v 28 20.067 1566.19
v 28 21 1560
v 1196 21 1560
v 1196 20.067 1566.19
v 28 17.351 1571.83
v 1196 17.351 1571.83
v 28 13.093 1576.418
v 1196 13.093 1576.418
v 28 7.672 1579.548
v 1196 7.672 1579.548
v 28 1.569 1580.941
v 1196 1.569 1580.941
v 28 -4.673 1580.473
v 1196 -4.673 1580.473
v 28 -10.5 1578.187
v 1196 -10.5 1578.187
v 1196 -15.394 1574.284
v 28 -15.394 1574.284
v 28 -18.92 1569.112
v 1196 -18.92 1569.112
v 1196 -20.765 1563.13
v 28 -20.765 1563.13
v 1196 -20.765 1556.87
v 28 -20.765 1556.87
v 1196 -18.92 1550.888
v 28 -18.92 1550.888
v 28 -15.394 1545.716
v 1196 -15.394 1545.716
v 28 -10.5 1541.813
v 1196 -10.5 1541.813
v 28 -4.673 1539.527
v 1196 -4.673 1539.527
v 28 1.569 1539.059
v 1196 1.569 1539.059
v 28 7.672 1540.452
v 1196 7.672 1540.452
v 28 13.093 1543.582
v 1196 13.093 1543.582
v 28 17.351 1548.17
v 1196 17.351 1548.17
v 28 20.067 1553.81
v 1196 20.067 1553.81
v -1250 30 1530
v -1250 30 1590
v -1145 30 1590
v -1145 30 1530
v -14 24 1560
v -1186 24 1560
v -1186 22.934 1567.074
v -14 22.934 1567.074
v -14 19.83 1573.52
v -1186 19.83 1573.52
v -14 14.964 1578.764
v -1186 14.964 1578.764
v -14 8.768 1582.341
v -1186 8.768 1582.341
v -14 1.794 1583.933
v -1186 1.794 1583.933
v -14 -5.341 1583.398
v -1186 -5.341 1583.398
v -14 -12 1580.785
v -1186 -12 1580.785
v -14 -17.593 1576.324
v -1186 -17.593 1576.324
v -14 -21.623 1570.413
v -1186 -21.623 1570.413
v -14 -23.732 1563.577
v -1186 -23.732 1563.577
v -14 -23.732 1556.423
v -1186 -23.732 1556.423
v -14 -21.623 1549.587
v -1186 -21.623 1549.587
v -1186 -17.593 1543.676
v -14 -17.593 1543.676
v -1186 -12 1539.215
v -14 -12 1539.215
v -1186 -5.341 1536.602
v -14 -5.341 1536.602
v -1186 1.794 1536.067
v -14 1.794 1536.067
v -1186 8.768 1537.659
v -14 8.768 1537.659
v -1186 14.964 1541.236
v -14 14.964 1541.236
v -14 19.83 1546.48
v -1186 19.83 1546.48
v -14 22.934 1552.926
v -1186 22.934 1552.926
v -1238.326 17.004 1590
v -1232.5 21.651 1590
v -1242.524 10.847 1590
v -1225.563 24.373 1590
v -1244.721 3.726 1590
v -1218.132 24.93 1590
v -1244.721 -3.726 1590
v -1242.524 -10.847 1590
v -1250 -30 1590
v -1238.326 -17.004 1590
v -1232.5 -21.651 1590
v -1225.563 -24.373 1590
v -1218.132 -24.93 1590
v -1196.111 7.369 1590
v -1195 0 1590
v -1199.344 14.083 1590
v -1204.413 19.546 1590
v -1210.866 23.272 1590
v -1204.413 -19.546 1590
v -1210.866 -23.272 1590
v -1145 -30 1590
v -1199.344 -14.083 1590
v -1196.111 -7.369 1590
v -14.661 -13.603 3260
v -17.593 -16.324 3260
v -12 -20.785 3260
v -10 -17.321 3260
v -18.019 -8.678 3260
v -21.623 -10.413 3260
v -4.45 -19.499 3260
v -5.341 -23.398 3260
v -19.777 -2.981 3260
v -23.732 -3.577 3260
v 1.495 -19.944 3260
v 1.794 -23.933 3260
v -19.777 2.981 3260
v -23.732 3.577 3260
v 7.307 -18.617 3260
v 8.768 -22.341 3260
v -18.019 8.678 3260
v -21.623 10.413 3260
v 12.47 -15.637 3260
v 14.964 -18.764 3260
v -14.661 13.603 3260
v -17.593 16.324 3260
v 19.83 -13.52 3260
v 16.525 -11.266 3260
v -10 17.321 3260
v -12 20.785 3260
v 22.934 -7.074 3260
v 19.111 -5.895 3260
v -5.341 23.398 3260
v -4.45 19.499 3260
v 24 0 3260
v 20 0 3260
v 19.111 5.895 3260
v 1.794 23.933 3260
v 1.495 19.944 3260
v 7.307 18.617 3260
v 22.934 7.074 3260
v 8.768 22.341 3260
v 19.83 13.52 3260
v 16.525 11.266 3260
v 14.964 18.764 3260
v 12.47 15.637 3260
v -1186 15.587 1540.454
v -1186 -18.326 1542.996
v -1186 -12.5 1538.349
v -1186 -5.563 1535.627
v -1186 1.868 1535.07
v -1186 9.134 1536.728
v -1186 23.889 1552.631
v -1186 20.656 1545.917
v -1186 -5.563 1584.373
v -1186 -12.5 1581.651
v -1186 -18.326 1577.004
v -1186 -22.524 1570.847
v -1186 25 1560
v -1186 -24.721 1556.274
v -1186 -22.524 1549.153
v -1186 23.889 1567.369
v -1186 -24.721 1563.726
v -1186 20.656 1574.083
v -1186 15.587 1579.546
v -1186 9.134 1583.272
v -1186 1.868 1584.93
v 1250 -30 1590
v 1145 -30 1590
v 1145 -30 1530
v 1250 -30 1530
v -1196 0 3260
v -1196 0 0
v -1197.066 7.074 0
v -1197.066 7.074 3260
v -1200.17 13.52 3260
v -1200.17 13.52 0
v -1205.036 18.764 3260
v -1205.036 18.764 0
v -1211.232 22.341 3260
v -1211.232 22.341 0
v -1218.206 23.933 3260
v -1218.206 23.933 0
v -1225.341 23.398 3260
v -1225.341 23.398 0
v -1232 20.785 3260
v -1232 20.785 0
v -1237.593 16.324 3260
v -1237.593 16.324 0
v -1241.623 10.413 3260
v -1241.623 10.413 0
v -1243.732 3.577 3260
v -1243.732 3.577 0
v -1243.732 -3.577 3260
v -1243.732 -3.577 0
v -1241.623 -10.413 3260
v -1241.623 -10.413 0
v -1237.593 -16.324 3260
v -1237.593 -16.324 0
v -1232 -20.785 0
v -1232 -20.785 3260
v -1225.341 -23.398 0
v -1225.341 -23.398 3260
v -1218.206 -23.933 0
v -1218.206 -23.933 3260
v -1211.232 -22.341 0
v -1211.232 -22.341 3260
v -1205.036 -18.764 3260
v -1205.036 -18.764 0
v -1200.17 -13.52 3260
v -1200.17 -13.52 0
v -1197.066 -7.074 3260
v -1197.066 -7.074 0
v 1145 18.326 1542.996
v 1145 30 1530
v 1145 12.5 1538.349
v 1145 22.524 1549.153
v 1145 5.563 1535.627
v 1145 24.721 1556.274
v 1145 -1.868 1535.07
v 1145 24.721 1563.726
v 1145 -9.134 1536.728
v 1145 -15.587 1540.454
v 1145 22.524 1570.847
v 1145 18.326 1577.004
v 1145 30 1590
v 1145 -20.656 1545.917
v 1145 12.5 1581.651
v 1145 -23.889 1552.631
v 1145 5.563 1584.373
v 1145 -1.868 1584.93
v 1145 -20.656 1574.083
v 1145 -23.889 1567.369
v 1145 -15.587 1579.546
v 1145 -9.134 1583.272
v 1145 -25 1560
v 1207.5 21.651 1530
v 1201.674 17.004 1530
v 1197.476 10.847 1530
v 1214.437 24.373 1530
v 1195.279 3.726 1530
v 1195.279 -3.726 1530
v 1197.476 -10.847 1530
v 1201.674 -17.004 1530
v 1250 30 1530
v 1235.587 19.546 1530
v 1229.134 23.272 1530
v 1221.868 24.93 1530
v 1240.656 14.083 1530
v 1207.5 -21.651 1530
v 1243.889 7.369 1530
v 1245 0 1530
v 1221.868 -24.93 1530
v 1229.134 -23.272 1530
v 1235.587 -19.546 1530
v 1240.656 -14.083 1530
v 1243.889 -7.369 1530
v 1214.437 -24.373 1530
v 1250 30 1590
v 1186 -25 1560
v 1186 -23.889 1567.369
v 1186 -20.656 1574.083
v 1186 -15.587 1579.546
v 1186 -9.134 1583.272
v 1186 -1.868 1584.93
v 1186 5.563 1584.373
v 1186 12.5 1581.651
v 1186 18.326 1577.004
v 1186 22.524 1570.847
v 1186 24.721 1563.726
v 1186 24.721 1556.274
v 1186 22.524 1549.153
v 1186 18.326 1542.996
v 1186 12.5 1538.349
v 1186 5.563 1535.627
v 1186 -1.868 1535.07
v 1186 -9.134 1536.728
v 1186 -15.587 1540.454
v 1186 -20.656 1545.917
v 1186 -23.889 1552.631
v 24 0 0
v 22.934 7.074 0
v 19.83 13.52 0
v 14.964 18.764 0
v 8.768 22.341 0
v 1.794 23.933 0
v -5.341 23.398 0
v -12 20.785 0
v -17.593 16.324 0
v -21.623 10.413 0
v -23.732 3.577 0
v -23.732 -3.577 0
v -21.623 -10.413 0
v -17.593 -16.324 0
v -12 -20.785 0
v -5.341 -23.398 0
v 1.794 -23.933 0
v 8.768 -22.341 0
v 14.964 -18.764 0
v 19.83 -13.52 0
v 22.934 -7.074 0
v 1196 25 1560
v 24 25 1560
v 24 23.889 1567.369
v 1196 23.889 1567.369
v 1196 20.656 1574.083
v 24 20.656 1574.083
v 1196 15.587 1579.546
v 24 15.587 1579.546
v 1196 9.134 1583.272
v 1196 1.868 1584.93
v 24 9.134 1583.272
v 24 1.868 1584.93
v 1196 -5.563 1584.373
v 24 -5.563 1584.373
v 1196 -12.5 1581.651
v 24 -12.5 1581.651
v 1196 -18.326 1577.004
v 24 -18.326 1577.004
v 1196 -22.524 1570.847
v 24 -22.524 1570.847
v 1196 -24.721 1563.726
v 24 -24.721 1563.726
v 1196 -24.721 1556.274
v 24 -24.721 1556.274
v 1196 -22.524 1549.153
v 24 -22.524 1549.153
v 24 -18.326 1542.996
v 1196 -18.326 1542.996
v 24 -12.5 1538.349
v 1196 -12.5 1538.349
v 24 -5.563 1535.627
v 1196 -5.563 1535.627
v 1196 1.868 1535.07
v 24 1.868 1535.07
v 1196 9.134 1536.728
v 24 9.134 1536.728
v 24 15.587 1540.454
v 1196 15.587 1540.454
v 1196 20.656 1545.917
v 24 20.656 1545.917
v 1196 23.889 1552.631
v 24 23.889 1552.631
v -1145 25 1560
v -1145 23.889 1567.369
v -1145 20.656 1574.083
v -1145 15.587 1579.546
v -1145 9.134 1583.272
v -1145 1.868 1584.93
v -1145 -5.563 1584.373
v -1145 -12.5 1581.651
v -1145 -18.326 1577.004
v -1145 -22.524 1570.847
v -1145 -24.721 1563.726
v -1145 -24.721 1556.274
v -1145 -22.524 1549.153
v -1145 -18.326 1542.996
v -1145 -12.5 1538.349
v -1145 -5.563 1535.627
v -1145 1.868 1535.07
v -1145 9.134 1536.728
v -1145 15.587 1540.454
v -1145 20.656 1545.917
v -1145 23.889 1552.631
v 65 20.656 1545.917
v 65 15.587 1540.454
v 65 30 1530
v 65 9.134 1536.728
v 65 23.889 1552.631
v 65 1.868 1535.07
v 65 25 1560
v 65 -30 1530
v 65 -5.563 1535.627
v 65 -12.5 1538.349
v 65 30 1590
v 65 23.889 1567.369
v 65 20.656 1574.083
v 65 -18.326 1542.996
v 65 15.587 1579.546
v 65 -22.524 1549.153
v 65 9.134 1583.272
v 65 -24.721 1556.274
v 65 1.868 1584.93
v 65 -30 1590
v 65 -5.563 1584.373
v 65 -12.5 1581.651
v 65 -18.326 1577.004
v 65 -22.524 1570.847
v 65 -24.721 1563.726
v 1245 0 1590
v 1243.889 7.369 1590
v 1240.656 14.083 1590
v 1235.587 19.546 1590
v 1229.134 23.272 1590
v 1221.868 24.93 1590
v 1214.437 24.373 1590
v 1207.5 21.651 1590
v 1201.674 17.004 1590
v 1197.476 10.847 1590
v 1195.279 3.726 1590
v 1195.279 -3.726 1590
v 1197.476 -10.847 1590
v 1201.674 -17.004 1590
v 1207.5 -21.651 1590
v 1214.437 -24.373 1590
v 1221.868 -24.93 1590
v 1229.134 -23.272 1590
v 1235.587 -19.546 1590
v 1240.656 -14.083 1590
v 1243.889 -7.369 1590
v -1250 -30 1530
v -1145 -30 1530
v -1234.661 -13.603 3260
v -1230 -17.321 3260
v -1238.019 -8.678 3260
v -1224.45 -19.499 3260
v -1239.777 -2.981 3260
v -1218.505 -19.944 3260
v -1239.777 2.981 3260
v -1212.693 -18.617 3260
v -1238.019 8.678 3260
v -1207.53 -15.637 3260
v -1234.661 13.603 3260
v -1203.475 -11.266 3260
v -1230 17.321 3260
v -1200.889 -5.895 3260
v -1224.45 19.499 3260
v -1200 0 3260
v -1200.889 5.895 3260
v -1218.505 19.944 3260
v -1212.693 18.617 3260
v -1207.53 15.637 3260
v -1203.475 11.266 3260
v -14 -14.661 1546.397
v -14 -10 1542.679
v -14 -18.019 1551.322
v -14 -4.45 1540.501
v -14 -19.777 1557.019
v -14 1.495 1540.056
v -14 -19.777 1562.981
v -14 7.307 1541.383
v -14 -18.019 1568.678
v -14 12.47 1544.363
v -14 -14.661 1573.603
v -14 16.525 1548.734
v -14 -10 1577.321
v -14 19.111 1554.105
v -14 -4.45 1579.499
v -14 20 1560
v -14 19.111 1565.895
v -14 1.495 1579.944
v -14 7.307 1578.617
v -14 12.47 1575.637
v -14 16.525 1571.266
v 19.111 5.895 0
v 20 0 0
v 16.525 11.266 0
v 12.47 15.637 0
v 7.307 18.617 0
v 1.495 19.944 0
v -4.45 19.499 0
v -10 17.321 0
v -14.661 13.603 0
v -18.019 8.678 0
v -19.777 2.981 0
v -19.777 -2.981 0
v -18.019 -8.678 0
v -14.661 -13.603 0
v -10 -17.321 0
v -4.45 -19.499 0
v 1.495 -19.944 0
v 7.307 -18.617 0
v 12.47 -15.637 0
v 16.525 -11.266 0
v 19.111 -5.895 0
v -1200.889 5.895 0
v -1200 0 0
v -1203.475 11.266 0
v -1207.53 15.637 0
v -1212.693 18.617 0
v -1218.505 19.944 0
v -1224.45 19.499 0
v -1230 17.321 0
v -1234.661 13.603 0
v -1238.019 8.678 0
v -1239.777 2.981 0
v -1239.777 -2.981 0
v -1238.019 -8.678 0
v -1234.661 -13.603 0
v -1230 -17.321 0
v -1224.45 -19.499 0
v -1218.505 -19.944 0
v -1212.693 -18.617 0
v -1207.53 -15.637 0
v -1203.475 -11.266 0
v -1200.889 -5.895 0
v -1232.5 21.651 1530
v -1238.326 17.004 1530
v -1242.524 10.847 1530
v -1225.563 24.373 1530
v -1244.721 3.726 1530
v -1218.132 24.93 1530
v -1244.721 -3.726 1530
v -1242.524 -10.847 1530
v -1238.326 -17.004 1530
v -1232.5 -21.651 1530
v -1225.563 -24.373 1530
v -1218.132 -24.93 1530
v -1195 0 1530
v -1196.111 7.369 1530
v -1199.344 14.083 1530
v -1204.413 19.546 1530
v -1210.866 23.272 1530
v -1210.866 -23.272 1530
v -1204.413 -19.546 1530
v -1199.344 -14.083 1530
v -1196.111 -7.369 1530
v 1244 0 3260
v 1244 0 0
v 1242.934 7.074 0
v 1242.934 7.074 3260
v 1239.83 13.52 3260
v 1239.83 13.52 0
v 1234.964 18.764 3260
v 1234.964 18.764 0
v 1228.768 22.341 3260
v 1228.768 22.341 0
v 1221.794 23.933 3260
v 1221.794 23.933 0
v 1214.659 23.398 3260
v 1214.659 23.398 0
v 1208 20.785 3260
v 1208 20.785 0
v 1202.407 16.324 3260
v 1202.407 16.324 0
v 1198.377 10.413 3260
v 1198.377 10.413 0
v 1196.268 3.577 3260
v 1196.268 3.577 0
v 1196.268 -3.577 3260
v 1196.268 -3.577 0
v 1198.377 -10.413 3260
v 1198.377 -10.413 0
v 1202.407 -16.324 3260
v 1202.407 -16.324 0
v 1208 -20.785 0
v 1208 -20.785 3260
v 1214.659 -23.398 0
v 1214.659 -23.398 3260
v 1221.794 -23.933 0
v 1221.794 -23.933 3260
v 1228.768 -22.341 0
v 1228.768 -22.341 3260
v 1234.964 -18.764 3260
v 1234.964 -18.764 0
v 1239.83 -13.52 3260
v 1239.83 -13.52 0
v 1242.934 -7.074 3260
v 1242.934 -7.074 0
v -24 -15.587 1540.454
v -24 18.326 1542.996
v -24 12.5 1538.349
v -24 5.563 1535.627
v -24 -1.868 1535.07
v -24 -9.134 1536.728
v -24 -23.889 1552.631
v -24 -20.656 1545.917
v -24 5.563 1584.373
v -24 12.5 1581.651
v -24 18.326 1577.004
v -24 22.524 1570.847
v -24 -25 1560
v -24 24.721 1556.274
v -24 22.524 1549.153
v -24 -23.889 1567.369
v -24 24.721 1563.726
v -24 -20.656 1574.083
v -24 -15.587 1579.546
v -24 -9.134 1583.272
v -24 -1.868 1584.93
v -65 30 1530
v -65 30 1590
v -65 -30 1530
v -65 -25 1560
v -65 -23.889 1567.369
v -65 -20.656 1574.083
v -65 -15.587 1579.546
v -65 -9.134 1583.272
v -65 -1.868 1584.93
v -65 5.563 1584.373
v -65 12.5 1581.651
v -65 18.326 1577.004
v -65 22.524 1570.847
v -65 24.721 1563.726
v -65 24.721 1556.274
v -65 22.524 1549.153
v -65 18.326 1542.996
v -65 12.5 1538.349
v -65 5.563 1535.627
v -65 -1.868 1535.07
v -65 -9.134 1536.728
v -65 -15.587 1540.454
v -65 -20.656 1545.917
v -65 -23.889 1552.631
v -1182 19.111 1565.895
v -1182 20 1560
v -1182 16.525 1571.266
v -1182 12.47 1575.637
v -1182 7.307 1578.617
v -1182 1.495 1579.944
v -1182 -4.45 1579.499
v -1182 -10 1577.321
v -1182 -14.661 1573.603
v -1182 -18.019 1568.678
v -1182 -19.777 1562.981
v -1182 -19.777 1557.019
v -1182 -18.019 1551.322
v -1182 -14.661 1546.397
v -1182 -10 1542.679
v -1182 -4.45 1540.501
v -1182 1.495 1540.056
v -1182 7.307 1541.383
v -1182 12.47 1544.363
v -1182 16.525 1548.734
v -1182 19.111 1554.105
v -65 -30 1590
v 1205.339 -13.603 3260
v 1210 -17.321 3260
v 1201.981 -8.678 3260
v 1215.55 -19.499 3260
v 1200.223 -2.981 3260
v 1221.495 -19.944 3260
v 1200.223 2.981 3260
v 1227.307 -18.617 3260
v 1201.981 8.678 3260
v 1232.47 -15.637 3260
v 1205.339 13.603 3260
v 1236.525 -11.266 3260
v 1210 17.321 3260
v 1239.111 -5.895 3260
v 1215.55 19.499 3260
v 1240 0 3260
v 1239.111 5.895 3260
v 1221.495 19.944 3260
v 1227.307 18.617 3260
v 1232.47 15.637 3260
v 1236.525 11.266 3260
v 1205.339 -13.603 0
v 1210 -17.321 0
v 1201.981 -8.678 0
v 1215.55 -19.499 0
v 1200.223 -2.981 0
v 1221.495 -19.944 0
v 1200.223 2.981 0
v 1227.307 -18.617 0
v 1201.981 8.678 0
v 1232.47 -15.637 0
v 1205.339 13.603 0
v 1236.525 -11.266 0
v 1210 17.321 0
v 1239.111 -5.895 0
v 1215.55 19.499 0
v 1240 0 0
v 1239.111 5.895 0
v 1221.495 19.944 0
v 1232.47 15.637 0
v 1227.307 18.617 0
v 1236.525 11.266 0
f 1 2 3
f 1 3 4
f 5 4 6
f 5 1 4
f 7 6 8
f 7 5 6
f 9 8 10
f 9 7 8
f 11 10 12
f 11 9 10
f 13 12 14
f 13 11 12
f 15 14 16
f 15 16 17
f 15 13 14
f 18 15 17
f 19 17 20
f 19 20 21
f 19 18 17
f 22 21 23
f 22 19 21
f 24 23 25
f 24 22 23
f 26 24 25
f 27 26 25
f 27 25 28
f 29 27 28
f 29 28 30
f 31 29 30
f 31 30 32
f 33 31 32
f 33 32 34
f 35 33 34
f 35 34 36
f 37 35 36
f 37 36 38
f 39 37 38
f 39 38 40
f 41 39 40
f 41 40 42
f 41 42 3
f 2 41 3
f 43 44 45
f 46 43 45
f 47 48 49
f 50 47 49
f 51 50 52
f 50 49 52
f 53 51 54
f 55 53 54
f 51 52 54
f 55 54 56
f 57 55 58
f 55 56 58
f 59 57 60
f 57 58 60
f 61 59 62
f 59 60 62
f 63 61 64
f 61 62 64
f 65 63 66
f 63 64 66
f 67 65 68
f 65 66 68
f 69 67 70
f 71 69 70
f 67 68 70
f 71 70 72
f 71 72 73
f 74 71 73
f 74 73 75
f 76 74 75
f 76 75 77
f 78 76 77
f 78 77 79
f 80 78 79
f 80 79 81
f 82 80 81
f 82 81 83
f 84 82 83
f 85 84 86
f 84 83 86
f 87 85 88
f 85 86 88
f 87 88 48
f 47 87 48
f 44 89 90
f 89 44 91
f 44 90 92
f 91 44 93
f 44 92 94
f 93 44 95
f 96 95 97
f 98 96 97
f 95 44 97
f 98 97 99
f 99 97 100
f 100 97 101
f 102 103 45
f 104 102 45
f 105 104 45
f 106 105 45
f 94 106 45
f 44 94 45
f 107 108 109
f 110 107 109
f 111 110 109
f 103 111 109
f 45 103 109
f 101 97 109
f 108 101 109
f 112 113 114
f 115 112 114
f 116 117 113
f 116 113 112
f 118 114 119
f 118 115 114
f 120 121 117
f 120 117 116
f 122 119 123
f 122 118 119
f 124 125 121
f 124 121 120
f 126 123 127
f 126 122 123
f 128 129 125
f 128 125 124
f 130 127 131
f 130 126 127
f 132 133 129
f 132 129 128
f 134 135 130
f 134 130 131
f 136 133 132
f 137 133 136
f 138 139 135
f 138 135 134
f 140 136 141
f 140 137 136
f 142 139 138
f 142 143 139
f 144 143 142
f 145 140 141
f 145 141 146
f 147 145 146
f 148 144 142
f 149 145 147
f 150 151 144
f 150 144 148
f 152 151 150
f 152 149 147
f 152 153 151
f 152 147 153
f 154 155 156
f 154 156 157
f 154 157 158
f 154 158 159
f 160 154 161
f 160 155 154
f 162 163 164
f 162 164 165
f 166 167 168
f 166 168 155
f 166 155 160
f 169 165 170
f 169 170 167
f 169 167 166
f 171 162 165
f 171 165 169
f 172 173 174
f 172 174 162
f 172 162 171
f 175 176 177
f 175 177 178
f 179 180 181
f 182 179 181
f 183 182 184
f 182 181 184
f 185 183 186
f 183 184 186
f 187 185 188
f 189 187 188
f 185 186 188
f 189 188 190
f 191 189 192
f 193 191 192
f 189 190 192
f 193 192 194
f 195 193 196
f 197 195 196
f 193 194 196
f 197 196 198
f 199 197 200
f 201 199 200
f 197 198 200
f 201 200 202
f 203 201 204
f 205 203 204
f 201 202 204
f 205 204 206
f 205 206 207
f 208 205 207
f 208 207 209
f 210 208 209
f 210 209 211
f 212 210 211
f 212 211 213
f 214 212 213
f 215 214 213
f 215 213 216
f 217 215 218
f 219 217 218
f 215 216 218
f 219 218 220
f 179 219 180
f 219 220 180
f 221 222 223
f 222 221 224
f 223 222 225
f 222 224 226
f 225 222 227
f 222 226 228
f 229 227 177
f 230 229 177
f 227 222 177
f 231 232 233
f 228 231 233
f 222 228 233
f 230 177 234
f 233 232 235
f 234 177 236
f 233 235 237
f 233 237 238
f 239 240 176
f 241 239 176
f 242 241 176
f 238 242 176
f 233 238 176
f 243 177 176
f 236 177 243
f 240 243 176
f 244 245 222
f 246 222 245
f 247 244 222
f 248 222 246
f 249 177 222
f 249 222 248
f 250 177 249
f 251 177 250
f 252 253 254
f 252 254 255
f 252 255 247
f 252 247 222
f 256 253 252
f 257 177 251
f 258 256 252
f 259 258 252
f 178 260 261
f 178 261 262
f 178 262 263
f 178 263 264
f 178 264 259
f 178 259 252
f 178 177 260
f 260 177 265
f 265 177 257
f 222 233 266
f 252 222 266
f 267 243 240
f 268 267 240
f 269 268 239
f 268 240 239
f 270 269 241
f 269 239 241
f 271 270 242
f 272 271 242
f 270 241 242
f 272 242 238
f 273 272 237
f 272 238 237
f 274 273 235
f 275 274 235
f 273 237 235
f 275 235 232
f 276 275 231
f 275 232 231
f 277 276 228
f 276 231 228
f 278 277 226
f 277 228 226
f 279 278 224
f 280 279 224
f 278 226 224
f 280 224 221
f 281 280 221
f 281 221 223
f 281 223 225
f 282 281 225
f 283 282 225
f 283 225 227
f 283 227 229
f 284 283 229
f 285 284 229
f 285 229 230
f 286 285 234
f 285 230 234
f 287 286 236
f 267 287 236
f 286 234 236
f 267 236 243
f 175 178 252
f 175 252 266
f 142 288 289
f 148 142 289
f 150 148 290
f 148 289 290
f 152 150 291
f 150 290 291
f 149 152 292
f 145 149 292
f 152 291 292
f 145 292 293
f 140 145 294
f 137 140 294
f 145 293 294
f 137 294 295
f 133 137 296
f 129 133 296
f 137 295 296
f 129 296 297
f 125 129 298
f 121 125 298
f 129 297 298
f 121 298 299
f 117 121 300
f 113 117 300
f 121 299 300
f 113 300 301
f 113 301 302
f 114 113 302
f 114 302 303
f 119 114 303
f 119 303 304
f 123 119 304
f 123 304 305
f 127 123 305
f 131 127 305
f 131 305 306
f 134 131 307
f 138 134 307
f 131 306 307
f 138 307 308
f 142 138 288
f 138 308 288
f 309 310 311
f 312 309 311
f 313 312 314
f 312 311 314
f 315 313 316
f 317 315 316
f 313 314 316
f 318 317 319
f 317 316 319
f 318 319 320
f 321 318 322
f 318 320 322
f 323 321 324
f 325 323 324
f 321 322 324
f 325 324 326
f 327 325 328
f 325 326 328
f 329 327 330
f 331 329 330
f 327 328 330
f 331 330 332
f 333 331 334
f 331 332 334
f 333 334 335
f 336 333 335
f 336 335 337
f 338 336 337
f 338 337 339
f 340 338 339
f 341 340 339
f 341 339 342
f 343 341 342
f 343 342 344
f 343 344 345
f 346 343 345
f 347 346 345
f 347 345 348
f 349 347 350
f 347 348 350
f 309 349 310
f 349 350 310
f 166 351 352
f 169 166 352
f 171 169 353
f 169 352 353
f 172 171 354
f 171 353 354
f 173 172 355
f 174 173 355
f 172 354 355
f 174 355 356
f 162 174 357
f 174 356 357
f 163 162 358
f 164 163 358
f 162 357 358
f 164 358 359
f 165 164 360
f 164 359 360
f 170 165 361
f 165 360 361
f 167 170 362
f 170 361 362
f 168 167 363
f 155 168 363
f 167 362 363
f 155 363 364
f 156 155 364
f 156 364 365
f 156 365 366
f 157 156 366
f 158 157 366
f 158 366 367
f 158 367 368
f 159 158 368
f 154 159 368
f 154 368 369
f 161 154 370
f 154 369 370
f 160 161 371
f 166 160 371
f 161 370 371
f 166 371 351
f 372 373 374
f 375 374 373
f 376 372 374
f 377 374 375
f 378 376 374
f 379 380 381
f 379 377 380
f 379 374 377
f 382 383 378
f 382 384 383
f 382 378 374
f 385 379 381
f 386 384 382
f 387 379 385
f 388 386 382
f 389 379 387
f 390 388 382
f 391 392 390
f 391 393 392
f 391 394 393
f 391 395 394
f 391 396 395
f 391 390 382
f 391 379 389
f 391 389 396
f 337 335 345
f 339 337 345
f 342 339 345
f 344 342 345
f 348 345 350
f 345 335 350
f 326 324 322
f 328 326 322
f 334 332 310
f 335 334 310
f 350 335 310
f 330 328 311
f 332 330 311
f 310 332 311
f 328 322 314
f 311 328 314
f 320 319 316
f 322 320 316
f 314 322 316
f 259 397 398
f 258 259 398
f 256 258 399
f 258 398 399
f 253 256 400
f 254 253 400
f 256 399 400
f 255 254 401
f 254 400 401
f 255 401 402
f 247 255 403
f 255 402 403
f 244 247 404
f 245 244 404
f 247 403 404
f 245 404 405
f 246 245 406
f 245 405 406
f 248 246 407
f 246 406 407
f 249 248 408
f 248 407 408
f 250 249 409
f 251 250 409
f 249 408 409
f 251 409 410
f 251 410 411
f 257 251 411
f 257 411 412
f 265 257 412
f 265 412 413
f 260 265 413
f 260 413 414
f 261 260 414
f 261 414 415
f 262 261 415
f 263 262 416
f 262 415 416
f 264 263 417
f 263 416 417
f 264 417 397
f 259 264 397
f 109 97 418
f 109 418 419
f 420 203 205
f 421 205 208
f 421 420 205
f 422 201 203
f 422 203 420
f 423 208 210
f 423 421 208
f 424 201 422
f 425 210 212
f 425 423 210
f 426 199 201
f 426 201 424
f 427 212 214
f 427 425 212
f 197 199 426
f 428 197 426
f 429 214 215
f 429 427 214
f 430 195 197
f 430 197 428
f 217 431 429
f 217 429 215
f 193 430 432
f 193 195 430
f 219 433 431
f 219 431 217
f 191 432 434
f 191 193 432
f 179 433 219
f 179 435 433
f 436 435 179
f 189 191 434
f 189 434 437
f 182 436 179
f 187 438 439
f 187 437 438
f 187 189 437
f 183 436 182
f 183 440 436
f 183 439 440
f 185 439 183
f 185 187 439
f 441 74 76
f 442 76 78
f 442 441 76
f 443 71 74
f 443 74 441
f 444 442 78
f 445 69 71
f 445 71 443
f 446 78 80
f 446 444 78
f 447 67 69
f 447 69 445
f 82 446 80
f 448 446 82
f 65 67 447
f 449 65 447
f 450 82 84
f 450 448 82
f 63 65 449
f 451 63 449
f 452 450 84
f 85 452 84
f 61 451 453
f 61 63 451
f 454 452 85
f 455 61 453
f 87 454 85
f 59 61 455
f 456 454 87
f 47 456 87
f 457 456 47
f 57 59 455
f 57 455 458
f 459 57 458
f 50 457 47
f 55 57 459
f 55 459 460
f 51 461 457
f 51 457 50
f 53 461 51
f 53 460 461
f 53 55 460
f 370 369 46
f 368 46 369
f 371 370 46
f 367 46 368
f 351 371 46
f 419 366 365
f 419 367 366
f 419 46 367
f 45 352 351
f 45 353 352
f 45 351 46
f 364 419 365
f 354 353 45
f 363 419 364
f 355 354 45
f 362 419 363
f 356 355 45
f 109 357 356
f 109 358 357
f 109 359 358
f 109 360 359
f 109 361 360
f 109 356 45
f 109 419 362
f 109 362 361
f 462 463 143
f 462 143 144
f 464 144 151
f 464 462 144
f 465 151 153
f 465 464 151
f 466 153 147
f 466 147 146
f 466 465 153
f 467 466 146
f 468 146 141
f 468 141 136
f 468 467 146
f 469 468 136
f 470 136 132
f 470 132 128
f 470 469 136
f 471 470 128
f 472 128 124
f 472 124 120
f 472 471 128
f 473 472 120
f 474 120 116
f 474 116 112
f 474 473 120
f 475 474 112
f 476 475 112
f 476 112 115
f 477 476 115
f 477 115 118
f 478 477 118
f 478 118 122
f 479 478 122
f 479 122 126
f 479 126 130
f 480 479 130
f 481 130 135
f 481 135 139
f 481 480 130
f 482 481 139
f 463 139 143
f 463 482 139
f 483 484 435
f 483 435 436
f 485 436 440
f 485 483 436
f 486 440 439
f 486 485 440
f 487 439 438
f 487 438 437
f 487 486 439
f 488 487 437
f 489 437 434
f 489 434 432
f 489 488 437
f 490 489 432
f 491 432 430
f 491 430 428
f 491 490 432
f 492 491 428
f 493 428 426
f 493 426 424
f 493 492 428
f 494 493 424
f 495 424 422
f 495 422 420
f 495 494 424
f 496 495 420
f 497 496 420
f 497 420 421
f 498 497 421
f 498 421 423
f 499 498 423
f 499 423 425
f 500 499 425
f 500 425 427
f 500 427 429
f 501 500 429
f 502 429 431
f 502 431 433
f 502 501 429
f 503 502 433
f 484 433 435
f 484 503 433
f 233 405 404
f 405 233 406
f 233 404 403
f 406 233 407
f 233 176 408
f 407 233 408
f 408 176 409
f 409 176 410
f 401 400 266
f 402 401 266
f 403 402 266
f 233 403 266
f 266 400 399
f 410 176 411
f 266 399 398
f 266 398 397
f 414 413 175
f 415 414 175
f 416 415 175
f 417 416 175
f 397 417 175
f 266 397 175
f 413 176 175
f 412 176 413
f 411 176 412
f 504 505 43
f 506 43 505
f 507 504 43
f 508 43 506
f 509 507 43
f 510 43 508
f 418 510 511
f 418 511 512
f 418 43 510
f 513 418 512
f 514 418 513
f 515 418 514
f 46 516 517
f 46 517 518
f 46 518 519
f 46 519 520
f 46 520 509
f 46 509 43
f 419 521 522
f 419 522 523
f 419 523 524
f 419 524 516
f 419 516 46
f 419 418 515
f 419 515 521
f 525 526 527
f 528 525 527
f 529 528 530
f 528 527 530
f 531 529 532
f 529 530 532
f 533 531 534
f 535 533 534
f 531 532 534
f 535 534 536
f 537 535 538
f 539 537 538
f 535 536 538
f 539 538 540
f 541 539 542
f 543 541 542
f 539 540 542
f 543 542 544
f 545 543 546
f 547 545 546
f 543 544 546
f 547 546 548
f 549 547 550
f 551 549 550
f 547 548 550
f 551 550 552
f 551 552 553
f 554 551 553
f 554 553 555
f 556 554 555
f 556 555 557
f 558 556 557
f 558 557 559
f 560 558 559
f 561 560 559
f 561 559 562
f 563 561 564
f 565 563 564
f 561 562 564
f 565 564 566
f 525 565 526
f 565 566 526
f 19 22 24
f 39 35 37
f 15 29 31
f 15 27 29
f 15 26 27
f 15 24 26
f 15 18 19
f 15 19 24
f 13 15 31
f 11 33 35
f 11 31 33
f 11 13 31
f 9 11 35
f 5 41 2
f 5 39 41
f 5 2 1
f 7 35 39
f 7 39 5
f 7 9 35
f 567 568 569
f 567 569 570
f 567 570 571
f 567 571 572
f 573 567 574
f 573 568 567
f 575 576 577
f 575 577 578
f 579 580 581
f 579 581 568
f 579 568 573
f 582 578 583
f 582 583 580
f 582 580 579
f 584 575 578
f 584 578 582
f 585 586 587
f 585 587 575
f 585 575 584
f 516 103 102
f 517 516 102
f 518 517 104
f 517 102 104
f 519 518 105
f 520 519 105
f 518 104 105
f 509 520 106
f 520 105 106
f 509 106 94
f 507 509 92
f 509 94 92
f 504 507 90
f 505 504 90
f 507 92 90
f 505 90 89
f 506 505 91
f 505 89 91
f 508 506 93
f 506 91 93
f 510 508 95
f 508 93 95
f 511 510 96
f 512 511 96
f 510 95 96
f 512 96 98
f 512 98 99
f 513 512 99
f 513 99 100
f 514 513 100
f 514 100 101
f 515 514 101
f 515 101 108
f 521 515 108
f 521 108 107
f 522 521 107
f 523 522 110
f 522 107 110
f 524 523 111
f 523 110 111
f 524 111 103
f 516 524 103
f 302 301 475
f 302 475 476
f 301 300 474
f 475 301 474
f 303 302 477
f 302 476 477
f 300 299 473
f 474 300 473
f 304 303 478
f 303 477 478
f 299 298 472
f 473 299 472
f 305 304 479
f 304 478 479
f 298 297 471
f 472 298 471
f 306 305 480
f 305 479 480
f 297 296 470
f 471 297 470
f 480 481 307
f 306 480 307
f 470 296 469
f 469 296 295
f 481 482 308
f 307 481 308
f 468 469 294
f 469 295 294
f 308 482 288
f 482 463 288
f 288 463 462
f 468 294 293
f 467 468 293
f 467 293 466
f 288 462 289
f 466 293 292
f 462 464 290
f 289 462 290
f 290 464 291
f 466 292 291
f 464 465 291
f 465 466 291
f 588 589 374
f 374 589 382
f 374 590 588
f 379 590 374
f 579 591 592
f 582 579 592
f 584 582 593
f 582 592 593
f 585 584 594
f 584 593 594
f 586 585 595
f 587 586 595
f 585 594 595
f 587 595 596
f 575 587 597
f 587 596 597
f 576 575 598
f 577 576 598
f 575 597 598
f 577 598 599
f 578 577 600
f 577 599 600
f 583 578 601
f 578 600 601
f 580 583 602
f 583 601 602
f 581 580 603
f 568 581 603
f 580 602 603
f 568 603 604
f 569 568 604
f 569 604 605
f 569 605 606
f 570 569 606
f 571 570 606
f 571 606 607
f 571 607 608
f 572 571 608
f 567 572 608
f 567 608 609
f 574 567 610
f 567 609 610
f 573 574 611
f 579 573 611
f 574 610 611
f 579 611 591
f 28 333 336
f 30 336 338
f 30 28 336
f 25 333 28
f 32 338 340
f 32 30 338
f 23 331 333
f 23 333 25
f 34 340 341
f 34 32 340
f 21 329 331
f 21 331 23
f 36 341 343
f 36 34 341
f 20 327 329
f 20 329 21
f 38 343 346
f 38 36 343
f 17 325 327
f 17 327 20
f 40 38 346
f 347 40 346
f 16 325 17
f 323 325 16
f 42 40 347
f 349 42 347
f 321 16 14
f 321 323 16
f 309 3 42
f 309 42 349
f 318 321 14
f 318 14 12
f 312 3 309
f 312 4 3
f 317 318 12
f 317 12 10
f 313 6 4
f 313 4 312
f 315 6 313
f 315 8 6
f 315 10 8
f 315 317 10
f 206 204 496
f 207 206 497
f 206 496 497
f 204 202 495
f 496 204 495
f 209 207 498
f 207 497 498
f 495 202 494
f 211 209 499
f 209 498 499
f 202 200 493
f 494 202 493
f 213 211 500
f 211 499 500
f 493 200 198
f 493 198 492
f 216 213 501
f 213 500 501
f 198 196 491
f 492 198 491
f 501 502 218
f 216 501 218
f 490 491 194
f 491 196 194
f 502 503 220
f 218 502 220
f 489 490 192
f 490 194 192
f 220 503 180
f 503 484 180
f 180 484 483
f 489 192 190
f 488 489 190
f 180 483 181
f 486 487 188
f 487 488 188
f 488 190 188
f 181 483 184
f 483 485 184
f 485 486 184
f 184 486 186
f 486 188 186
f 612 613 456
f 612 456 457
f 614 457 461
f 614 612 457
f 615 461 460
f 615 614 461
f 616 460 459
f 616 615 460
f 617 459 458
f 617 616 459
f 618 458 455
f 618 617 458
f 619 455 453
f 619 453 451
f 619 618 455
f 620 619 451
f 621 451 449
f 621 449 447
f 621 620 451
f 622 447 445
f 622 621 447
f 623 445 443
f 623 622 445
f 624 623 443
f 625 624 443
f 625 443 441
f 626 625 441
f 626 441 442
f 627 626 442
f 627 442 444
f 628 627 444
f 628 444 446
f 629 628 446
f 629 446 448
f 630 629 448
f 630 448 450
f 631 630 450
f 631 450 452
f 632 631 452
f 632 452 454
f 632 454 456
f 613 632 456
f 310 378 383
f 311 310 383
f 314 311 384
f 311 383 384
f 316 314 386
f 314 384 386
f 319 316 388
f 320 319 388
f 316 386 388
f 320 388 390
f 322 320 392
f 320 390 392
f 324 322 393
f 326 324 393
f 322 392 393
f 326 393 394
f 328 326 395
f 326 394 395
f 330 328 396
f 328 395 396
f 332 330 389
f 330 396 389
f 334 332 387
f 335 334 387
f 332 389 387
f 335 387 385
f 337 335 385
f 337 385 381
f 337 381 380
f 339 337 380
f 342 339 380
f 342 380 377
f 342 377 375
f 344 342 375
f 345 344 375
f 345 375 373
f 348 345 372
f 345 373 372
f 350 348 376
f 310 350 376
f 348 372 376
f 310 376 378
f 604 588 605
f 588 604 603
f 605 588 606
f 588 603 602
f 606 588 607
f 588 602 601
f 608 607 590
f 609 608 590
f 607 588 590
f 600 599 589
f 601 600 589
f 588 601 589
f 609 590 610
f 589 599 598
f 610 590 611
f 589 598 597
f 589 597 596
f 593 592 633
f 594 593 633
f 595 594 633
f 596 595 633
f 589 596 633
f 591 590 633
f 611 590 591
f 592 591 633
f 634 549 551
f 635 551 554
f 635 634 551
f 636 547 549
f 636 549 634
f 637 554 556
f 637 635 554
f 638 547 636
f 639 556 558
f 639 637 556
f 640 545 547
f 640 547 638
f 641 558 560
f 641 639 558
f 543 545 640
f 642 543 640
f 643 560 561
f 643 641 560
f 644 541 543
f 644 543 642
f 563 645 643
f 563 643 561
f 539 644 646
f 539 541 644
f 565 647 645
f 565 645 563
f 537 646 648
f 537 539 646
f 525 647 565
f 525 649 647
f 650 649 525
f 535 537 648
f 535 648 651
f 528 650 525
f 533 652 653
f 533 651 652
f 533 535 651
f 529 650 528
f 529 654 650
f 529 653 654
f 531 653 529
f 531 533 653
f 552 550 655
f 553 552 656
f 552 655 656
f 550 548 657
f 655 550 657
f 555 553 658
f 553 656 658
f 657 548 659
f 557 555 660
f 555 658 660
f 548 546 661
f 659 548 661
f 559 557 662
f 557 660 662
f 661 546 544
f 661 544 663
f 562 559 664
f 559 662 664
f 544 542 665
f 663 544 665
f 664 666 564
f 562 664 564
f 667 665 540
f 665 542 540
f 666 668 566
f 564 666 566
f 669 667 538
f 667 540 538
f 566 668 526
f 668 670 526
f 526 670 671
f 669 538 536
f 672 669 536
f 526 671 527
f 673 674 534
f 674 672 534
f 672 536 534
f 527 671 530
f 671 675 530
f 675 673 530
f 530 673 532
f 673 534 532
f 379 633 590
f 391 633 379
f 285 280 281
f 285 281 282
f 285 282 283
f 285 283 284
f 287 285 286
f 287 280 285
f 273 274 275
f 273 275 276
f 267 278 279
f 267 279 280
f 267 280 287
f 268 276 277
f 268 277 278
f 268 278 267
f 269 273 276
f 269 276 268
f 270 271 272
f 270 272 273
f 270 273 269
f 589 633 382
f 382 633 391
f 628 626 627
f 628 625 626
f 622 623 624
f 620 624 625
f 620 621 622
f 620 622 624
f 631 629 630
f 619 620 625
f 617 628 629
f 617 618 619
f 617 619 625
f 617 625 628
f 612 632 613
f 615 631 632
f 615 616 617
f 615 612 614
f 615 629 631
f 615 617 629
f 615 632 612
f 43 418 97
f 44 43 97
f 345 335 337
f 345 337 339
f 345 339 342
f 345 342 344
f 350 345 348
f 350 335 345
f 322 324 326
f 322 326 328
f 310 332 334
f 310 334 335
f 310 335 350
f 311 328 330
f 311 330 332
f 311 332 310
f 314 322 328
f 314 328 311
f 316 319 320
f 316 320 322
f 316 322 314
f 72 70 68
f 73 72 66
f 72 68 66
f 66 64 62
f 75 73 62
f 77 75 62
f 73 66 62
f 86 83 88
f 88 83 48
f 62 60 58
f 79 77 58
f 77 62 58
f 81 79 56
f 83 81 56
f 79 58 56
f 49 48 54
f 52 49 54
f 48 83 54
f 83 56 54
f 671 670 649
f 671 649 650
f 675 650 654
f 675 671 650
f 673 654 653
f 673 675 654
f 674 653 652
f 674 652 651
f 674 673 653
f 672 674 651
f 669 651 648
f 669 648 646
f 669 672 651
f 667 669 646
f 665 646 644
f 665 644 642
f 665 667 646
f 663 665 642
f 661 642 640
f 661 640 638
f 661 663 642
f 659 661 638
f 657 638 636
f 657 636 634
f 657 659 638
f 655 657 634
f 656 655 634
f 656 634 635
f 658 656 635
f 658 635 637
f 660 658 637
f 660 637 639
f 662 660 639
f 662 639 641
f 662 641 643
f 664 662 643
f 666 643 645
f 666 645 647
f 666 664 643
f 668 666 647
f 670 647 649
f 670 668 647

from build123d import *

# Parameters (mm, degrees)
F0_R          = 24
F0_R_2        = 20
F1_DEPTH      = 3260
F2_W          = 130
F2_H          = 60
F3_DEPTH      = 30
F3_DEPTH_BACK = 30
F2_W_2        = 105
F4_R          = 25
F5_DEPTH      = 60
F9_R          = 25
F10_DEPTH     = 41
F8_R          = 25
F11_DEPTH     = 41
F7_R          = 25
F12_DEPTH     = 41
F6_R          = 25
F13_DEPTH     = 41
F14_R         = 24
F15_DEPTH     = 1172
F16_DEPTH     = 1172
F17_T         = -4
F18_T         = -4


with BuildPart() as f1:
    # F0 (on Top) → F1 (new body)
    with BuildSketch(Plane.XY):
        Circle(F0_R)
        Circle(F0_R_2, mode=Mode.SUBTRACT)
    extrude(amount=F1_DEPTH)


with BuildPart() as f1b:
    # F0 (on Top) → F1, piece 2 (new body)
    with BuildSketch(Plane.XY):
        with Locations((-1220, 0)):
            Circle(F0_R)
        with Locations((-1220, 0)):
            Circle(F0_R_2, mode=Mode.SUBTRACT)
    extrude(amount=F1_DEPTH)


with BuildPart() as f1c:
    # F0 (on Top) → F1, piece 3 (new body)
    with BuildSketch(Plane.XY):
        with Locations((1220, 0)):
            Circle(F0_R)
        with Locations((1220, 0)):
            Circle(F0_R_2, mode=Mode.SUBTRACT)
    extrude(amount=F1_DEPTH)


with BuildPart() as f3:
    # F2 (on Front) → F3 (new body, two sides)
    with BuildSketch(Plane.XZ) as f3_sk:
        with Locations((0, 1560)):
            Rectangle(F2_W, F2_H)
    extrude(amount=F3_DEPTH)
    extrude(f3_sk.sketch, amount=-F3_DEPTH_BACK)

    # F9 (on face) → F10 (cut)
    with BuildSketch(Plane.YZ.offset(65)):
        with Locations((0, 1560)):
            Circle(F9_R)
    extrude(amount=-F10_DEPTH, mode=Mode.SUBTRACT)

    # F7 (on face) → F12 (cut)
    with BuildSketch(Plane(origin=(-65, 0, 0), x_dir=(0, -1, 0), z_dir=(-1, 0, 0))):
        with Locations((0, 1560)):
            Circle(F7_R)
    extrude(amount=-F12_DEPTH, mode=Mode.SUBTRACT)


with BuildPart() as f3b:
    # F2 (on Front) → F3, piece 2 (new body, two sides)
    with BuildSketch(Plane.XZ) as f3_2_sk:
        with Locations((-1197.5, 1560)):
            Rectangle(F2_W_2, F2_H)
    extrude(amount=F3_DEPTH)
    extrude(f3_2_sk.sketch, amount=-F3_DEPTH_BACK)


with BuildPart() as f3c:
    # F2 (on Front) → F3, piece 3 (new body, two sides)
    with BuildSketch(Plane.XZ) as f3_3_sk:
        with Locations((1197.5, 1560)):
            Rectangle(F2_W_2, F2_H)
    extrude(amount=F3_DEPTH)
    extrude(f3_3_sk.sketch, amount=-F3_DEPTH_BACK)


with BuildPart() as f5_tool:
    # F4 (on face) → F5 (new body)
    with BuildSketch(Plane.XY.offset(1590)):
        with Locations((-1220, 0)):
            Circle(F4_R)
        with Locations((1220, 0)):
            Circle(F4_R)
    extrude(amount=-F5_DEPTH)


with BuildPart() as f3b_1:
    add(f3b.part)

    # F5: cut by f5_tool
    add(f5_tool.part, mode=Mode.SUBTRACT)

    # F6 (on face) → F13 (cut)
    with BuildSketch(Plane.YZ.offset(-1145)):
        with Locations((0, 1560)):
            Circle(F6_R)
    extrude(amount=-F13_DEPTH, mode=Mode.SUBTRACT)


with BuildPart() as f3c_1:
    add(f3c.part)

    # F5: cut by f5_tool
    add(f5_tool.part, mode=Mode.SUBTRACT)

    # F8 (on face) → F11 (cut)
    with BuildSketch(Plane(origin=(1145, 0, 0), x_dir=(0, -1, 0), z_dir=(-1, 0, 0))):
        with Locations((0, 1560)):
            Circle(F8_R)
    extrude(amount=-F11_DEPTH, mode=Mode.SUBTRACT)


with BuildPart() as f15:
    # F14 (on face) → F15 (new body)
    with BuildSketch(Plane.YZ.offset(-1186)):
        with Locations((0, 1560)):
            Circle(F14_R)
    extrude(amount=F15_DEPTH)

    # F17
    f17_openings = [f15.faces().sort_by_distance(p)[0] for p in [
        (-14, 0, 1560),
    ]]
    offset(amount=F17_T, openings=f17_openings)


with BuildPart() as f16:
    # F16 (new): a face of the model
    f16_faces = [f3.part.faces().sort_by_distance(p)[0] for p in [
        (24, 0, 1560),
    ]]
    extrude(f16_faces, amount=F16_DEPTH)

    # F18
    f18_openings = [f16.faces().sort_by_distance(p)[0] for p in [
        (1196, 0, 1560),
    ]]
    offset(amount=F18_T, openings=f18_openings)


solid = Compound([f1.part, f1b.part, f1c.part, f3.part, f3b_1.part, f3c_1.part, f15.part, f16.part])
